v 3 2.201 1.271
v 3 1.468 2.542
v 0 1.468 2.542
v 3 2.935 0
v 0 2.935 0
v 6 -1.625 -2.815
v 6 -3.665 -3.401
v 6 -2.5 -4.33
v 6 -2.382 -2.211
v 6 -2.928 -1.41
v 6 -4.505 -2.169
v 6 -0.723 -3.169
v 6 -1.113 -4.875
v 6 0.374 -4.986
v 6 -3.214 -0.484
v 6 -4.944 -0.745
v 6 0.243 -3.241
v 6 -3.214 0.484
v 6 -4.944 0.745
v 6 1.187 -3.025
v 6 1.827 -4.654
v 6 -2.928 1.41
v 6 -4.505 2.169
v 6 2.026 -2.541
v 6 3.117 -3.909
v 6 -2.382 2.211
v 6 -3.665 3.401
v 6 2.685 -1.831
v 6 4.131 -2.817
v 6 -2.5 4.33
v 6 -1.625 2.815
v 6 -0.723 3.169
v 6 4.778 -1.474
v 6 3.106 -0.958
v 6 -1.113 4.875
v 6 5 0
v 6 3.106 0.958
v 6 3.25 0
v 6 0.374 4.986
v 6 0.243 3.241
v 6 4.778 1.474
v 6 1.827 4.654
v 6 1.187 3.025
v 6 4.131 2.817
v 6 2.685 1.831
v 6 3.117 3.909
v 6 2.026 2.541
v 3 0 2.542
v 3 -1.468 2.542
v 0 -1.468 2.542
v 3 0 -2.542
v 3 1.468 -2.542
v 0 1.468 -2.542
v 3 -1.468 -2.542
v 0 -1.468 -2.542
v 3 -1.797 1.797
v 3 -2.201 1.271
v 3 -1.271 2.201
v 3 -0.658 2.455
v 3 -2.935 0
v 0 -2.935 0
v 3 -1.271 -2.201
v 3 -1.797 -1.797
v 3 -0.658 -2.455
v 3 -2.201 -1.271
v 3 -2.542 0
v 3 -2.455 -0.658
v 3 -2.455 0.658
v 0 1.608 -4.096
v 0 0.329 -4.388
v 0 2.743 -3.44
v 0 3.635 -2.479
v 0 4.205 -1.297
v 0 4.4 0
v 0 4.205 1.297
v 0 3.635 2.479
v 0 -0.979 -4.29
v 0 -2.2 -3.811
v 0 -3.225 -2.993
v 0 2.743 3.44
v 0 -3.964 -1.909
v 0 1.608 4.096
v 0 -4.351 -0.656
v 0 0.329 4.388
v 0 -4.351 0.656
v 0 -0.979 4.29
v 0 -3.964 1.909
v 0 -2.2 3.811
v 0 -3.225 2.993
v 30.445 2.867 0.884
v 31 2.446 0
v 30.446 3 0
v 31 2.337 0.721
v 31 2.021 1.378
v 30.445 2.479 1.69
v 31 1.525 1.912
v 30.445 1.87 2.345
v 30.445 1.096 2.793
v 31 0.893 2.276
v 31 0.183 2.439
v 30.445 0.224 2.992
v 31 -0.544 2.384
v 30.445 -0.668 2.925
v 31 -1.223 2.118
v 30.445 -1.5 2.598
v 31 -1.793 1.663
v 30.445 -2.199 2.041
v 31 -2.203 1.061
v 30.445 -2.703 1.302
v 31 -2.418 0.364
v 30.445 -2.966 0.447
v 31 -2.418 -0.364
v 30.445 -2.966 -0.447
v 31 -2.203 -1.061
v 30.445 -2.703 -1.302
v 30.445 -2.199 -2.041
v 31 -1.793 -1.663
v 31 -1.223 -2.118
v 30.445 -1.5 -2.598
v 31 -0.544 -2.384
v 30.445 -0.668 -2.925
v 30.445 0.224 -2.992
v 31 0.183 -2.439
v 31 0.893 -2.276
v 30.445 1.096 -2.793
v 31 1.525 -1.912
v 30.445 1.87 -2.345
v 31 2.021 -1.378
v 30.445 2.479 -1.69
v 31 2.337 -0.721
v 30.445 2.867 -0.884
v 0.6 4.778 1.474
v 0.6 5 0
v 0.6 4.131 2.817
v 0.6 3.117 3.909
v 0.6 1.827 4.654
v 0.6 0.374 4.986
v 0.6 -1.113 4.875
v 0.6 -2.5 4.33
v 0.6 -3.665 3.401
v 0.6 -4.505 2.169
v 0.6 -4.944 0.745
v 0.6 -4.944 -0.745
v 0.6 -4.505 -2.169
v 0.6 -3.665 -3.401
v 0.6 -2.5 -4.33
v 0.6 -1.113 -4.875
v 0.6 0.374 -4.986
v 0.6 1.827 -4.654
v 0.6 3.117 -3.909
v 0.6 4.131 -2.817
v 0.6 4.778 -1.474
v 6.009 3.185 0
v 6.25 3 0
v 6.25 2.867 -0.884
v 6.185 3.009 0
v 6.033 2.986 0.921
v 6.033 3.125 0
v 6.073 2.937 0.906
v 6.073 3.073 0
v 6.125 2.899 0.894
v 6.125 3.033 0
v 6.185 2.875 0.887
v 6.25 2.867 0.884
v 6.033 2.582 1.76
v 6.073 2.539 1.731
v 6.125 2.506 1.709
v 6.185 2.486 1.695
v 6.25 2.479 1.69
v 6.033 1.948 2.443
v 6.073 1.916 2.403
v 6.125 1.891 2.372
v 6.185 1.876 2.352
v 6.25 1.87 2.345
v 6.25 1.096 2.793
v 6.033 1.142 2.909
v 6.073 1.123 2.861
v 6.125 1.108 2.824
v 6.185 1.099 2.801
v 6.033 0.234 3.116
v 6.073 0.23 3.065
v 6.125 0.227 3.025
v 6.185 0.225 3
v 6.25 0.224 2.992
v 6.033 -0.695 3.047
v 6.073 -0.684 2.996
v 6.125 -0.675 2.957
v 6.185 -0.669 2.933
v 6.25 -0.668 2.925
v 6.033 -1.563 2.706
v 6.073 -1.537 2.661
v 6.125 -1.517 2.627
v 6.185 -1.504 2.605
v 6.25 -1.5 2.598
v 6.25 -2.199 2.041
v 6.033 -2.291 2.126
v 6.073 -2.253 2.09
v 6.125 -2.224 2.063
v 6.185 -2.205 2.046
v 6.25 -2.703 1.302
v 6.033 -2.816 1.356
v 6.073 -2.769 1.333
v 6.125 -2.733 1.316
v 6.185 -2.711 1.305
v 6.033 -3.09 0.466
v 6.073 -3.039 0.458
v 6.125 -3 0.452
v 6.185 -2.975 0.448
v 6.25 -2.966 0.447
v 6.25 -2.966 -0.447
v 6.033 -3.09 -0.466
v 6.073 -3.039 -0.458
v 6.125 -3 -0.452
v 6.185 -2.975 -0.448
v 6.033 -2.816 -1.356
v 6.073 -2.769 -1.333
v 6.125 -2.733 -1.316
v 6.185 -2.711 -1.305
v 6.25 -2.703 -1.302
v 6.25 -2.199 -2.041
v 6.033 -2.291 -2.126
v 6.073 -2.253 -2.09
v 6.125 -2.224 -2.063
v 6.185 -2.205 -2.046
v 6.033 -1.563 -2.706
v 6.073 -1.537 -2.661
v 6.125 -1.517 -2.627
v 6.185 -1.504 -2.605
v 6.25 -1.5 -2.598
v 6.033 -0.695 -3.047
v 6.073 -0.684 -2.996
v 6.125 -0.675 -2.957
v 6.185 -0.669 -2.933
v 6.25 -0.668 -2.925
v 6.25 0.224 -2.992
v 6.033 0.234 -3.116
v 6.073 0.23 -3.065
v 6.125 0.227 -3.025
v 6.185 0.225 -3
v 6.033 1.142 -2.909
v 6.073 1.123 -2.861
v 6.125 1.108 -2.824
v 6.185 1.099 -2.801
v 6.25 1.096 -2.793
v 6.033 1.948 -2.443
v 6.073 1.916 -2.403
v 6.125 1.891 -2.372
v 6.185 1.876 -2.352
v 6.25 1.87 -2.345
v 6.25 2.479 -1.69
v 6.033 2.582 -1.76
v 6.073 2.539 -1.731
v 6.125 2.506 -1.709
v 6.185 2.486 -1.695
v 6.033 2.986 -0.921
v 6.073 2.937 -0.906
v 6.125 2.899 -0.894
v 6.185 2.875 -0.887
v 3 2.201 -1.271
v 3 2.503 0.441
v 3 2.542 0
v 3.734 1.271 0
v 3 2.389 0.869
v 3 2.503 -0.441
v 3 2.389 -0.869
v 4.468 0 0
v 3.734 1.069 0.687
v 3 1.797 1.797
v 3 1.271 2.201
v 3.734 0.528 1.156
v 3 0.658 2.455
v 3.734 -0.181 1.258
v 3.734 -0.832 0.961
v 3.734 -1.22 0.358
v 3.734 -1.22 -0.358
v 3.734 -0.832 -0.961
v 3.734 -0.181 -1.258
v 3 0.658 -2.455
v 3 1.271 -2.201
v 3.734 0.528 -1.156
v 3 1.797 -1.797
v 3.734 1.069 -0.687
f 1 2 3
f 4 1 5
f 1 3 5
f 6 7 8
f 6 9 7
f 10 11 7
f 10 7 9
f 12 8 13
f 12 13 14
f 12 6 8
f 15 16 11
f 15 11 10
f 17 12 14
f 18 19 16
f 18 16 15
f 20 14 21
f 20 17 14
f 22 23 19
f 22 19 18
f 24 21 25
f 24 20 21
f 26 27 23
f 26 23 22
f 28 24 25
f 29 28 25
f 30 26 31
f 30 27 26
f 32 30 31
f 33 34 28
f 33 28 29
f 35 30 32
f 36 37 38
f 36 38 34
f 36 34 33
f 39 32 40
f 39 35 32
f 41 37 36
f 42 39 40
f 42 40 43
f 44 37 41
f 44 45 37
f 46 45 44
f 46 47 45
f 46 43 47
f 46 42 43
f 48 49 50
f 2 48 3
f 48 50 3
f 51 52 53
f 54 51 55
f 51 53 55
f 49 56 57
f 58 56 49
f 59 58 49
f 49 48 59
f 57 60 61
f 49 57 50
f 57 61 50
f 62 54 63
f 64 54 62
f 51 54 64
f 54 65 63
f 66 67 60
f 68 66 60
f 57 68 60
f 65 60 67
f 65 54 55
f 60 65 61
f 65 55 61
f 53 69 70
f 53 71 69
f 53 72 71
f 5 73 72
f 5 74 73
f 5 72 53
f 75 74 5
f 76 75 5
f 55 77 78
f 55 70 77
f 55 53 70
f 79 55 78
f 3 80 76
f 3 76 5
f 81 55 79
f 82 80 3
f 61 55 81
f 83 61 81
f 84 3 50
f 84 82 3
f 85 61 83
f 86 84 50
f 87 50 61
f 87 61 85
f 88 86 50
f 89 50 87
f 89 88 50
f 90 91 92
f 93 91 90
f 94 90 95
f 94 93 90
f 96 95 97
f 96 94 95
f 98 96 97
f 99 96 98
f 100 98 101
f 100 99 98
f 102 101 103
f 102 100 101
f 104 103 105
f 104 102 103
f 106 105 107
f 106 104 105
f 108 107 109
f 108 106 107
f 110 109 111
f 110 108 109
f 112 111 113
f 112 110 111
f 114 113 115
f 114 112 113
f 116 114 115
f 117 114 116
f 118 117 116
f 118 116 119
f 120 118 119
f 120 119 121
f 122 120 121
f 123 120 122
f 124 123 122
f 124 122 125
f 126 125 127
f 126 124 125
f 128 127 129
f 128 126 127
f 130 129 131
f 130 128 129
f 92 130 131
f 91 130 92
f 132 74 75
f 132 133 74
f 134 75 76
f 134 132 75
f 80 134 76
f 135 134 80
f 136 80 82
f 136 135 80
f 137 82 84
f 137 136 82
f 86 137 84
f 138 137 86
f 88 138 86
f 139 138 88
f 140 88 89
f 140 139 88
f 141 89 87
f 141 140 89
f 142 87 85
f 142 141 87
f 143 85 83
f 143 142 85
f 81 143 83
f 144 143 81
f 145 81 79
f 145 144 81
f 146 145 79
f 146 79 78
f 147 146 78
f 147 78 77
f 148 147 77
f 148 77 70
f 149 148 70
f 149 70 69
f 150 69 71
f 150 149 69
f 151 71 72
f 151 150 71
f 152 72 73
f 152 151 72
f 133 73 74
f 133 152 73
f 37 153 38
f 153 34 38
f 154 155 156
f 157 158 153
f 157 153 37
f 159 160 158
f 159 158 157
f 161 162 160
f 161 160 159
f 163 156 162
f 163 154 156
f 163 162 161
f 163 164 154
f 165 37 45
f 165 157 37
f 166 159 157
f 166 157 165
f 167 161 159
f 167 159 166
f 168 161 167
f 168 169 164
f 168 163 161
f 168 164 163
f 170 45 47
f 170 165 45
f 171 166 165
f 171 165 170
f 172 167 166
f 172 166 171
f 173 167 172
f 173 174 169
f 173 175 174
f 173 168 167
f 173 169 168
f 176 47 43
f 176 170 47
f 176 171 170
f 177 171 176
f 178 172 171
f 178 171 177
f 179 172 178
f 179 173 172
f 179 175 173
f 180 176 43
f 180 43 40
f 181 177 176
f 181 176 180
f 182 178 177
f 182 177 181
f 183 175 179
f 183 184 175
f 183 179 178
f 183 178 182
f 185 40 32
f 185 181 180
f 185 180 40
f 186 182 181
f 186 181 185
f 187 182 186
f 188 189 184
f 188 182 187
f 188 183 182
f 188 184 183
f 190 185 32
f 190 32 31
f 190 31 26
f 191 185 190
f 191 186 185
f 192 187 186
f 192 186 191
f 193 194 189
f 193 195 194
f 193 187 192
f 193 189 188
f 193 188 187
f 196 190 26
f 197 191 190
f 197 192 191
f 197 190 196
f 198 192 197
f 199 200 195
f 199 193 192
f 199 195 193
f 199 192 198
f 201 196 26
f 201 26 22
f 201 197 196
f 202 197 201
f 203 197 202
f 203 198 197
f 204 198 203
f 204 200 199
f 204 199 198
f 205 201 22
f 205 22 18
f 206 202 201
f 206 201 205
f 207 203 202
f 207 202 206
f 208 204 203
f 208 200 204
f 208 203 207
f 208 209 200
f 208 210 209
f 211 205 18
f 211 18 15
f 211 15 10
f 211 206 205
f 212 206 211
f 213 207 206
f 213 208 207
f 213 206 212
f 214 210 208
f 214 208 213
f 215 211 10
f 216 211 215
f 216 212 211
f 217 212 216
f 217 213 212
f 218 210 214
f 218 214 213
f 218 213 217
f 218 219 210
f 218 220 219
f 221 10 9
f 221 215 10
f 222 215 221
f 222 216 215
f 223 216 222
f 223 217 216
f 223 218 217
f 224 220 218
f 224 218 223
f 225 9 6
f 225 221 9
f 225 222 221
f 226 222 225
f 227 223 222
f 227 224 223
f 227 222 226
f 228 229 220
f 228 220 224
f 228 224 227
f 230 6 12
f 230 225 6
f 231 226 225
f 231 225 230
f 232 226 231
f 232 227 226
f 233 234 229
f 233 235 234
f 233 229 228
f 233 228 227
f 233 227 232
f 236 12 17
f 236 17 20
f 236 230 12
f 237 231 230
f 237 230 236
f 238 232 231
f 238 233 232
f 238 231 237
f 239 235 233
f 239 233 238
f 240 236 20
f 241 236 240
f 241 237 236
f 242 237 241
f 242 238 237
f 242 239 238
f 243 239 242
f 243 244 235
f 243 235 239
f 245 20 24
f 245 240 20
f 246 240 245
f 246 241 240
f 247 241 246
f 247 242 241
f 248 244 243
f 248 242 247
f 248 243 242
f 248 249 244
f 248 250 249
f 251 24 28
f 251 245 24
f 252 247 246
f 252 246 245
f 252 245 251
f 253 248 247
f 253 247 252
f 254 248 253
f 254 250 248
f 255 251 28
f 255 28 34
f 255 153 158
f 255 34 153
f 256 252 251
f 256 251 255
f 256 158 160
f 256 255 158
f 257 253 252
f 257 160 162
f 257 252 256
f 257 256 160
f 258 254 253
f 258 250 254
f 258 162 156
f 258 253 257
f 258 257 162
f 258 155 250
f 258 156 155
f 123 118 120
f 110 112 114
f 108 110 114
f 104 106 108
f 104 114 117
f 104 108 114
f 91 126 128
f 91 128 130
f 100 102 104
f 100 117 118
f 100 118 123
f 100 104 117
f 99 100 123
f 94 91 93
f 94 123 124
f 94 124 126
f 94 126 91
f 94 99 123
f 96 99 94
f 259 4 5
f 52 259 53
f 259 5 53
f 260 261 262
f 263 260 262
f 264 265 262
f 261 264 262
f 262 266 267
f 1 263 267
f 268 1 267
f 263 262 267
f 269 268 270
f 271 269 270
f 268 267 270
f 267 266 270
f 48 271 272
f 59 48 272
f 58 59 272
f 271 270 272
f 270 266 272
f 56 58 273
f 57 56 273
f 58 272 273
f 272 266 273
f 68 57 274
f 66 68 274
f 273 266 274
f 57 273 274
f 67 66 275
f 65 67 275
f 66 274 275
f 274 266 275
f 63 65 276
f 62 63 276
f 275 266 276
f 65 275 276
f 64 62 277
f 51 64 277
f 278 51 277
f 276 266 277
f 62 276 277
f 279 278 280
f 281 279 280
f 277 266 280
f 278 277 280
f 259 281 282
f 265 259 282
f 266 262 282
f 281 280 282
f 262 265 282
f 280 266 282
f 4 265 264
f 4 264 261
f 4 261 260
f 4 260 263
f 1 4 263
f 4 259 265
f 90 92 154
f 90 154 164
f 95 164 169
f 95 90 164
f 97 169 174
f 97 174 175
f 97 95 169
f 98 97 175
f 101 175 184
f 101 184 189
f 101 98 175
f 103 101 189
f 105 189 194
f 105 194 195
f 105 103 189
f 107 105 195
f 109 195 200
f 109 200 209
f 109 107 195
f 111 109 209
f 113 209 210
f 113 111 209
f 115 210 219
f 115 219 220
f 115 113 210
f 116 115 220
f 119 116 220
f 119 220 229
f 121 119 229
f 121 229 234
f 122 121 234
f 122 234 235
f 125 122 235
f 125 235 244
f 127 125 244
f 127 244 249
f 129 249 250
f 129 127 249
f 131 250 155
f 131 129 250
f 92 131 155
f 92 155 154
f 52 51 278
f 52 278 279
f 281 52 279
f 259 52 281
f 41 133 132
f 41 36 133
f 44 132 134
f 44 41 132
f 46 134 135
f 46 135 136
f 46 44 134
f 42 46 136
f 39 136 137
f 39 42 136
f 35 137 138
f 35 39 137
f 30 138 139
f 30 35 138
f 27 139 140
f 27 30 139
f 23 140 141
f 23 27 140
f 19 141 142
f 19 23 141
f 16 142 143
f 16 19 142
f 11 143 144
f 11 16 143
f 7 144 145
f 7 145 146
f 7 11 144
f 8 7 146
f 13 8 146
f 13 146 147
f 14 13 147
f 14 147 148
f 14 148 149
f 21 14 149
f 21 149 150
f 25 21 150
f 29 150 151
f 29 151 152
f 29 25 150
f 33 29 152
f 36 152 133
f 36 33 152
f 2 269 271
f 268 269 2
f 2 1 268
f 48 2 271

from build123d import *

# Parameters (mm, degrees)
FILLET1_R   = 0.25
HEX_2_DEPTH = 3


with BuildPart() as part:
    # BodySke → Base-Revolve (revolve)
    with BuildSketch(Plane.XY):
        Polygon((0, 0), (0, 4.4), (0.6, 5), (6, 5), (6, 3), (30.4455, 3), (31, 2.4455), (31, 0), align=None)
    revolve(axis=Axis((-31.75, 0, 0), (1, 0, 0)))

    # Fillet1
    fillet1_edges = [part.edges().sort_by_distance(p)[0] for p in [
        (6, -3, 0),
    ]]
    fillet(fillet1_edges, radius=FILLET1_R)

    # Sketch2 → Hex-PreBroach (revolve, cut)
    with BuildSketch(Plane.XY):
        Polygon((0, 2.542), (3, 2.542), (4.467624384, 0), (0, 0), align=None)
    revolve(axis=Axis((0, 0, 0), (1, 0, 0)), mode=Mode.SUBTRACT)

    # Sketch3 → Hex 2 (cut)
    with BuildSketch(Plane(origin=(0, 0, 0), x_dir=(0, 0.5, 0.866025404), z_dir=(-1, 0, 0))):
        Polygon((1.467624384, 2.542), (-1.467624384, 2.542), (-2.935248769, 0), (-1.467624384, -2.542), (1.467624384, -2.542), (2.935248769, 0), align=None)
    extrude(amount=-HEX_2_DEPTH, mode=Mode.SUBTRACT)


solid = part.part
